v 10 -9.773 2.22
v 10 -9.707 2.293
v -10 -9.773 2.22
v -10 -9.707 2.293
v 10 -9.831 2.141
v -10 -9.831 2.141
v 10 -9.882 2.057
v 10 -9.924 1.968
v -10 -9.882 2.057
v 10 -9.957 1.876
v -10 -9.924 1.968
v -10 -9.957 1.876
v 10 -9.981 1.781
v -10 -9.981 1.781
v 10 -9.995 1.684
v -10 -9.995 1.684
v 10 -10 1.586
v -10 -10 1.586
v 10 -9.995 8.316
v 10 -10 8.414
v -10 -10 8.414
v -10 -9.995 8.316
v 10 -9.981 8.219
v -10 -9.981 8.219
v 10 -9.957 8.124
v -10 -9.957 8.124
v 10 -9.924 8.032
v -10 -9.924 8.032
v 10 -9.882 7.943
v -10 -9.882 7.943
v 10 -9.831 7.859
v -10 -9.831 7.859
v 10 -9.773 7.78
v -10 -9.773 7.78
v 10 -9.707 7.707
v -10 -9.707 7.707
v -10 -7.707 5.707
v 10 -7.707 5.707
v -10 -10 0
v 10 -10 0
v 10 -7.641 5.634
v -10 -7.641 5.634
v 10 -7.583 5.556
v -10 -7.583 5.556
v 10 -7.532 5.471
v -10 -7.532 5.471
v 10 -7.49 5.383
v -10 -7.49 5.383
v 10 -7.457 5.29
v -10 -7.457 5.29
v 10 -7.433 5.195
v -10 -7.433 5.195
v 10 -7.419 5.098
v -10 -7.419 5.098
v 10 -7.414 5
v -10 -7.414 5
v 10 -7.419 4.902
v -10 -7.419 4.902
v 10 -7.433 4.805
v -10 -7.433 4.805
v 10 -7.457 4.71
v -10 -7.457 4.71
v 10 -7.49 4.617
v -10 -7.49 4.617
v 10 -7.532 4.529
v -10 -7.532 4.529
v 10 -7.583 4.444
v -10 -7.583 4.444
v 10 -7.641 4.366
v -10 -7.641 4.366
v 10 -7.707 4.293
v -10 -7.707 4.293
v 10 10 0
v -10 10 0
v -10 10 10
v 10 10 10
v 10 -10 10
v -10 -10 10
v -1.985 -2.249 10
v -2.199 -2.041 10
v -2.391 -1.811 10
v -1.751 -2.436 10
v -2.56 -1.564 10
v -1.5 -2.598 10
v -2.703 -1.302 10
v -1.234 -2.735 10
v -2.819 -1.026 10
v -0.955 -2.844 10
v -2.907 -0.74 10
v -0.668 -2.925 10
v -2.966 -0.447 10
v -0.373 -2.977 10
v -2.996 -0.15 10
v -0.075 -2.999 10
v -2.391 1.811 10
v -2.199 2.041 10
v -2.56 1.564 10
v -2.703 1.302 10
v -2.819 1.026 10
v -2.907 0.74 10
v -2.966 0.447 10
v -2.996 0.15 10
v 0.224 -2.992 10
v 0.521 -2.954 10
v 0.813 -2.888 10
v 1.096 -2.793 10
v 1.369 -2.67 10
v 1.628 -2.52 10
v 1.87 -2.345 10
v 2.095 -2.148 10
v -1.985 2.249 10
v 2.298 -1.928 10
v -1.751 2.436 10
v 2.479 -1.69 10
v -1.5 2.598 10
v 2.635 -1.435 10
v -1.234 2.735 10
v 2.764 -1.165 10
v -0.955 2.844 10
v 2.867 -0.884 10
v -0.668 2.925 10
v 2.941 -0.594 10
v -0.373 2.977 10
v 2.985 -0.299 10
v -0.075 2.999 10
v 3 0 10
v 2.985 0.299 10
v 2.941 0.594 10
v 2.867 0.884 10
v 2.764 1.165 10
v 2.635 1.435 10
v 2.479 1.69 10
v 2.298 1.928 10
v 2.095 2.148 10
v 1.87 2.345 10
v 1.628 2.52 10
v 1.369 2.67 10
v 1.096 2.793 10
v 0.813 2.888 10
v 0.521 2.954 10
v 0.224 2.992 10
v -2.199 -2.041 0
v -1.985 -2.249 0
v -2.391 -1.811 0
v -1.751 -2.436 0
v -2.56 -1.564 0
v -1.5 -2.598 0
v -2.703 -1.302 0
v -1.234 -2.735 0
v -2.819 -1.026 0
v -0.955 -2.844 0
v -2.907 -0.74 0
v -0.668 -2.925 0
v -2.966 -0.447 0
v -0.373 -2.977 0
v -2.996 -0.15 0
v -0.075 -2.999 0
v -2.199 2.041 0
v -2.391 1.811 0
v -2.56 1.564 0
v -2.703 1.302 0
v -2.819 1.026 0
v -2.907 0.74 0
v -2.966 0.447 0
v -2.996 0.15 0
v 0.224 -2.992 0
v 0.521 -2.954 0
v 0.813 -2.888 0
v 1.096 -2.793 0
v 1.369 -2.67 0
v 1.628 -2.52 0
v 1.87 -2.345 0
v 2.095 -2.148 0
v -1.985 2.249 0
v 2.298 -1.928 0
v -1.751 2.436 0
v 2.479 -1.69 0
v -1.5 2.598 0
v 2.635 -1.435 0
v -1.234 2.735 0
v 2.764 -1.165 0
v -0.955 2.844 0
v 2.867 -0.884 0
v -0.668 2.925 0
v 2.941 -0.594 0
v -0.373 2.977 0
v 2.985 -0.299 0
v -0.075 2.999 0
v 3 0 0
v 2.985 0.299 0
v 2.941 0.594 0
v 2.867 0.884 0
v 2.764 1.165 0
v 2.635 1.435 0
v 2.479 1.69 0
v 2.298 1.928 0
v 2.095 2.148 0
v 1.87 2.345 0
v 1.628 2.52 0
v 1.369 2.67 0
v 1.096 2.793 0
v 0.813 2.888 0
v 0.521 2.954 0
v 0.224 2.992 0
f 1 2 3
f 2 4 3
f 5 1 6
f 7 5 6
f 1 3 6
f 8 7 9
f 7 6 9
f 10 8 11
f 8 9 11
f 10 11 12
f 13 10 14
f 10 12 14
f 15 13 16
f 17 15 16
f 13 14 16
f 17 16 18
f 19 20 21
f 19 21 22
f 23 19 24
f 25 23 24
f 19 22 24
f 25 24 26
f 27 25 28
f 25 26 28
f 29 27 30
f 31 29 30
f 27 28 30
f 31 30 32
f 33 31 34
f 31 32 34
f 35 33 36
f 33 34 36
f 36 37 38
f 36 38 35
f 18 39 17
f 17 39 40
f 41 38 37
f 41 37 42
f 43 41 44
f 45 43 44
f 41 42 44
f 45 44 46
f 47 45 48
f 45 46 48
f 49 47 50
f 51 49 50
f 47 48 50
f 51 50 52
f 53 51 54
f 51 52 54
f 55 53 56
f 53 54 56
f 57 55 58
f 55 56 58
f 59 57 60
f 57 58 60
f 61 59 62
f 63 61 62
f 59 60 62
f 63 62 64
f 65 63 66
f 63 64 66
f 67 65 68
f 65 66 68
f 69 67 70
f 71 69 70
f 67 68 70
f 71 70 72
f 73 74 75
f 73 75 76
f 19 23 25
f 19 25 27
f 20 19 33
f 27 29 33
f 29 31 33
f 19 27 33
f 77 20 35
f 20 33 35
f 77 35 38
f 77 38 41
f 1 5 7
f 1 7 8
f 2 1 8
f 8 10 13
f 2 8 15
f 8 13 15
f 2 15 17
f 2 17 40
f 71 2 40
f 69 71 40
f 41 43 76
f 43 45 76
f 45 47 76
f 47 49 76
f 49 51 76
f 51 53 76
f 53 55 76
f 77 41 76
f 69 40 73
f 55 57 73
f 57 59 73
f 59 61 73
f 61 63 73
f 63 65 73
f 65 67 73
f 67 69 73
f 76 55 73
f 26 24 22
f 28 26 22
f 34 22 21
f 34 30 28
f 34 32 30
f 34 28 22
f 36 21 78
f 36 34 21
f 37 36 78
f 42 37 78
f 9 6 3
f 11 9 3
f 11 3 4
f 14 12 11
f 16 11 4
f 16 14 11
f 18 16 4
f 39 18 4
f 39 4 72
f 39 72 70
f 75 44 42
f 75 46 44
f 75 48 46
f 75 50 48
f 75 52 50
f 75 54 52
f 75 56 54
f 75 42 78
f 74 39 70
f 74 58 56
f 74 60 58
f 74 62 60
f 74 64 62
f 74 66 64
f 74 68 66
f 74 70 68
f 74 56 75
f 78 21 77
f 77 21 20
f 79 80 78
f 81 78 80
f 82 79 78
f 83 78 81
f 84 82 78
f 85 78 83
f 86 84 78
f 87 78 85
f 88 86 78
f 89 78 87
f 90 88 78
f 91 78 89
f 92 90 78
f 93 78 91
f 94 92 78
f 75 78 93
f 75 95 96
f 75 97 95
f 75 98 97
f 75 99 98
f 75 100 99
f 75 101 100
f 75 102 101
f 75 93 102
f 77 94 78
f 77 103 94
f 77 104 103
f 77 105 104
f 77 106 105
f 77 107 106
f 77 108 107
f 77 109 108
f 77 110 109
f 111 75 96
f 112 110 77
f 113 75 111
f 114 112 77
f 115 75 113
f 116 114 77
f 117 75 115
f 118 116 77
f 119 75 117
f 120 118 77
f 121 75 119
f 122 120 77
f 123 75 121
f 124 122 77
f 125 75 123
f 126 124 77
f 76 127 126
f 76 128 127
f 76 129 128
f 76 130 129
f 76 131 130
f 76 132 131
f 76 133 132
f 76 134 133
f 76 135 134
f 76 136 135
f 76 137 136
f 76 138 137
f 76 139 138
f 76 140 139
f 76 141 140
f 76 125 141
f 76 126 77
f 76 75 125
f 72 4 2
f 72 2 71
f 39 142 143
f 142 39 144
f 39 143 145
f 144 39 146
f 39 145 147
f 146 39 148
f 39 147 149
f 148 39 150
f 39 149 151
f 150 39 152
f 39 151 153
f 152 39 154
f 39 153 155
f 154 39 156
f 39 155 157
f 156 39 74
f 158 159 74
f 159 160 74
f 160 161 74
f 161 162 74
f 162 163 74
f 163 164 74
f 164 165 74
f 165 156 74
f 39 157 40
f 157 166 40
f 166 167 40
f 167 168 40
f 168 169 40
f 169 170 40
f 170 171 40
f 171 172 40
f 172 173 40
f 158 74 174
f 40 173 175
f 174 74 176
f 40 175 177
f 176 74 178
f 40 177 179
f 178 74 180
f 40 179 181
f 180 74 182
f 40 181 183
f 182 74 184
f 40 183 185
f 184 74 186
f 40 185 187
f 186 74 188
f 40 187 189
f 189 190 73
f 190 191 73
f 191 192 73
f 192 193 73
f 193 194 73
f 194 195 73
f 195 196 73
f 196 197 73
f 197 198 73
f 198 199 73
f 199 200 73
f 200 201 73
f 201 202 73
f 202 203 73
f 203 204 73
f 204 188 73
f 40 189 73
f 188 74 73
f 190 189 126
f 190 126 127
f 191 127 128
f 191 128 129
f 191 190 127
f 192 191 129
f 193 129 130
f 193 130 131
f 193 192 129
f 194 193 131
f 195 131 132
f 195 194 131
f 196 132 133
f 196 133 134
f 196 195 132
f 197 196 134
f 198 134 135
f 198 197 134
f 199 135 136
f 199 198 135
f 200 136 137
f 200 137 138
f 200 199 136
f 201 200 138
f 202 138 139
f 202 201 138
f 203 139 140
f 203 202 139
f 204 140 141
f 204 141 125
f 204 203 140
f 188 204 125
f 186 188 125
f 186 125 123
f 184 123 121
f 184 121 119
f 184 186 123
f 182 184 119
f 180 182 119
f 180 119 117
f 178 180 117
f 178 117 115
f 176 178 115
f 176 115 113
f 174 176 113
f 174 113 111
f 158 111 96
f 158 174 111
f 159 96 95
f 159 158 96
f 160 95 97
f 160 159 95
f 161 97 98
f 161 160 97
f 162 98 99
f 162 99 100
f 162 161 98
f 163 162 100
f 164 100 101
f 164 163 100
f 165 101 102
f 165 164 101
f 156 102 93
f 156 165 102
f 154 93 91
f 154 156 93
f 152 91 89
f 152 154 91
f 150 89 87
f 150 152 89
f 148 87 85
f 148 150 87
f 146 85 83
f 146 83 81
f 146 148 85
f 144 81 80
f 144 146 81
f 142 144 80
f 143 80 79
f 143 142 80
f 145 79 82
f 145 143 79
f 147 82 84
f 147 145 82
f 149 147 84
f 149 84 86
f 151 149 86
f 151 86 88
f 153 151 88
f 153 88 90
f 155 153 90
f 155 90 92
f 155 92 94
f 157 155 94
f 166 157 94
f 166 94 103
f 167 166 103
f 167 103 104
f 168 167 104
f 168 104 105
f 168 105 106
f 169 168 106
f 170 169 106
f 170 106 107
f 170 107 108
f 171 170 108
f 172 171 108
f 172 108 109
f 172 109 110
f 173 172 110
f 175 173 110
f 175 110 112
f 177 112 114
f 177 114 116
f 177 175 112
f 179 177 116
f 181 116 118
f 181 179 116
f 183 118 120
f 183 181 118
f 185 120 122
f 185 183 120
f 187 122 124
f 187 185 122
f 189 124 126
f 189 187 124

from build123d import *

# Parameters (mm, degrees)
F0_W     = 20
F0_H     = 20
F0_R     = 3
F1_DEPTH = 10
F3_DEPTH = 20
F4_R     = 1


with BuildPart() as f1:
    # F0 (on Top) → F1 (new body)
    with BuildSketch(Plane.XY):
        Rectangle(F0_W, F0_H)
        Circle(F0_R, mode=Mode.SUBTRACT)
    extrude(amount=F1_DEPTH)

    # F2 (on face) → F3 (cut, through all)
    with BuildSketch(Plane.YZ.offset(10)):
        Polygon((-7, 5), (-10, 8), (-10, 2), align=None)
    extrude(amount=-F3_DEPTH, mode=Mode.SUBTRACT)

    # F4
    f4_edges = [f1.edges().sort_by_distance(p)[0] for p in [
        (0, -7, 5),
        (0, -10, 8),
        (0, -10, 2),
    ]]
    fillet(f4_edges, radius=F4_R)


solid = f1.part
